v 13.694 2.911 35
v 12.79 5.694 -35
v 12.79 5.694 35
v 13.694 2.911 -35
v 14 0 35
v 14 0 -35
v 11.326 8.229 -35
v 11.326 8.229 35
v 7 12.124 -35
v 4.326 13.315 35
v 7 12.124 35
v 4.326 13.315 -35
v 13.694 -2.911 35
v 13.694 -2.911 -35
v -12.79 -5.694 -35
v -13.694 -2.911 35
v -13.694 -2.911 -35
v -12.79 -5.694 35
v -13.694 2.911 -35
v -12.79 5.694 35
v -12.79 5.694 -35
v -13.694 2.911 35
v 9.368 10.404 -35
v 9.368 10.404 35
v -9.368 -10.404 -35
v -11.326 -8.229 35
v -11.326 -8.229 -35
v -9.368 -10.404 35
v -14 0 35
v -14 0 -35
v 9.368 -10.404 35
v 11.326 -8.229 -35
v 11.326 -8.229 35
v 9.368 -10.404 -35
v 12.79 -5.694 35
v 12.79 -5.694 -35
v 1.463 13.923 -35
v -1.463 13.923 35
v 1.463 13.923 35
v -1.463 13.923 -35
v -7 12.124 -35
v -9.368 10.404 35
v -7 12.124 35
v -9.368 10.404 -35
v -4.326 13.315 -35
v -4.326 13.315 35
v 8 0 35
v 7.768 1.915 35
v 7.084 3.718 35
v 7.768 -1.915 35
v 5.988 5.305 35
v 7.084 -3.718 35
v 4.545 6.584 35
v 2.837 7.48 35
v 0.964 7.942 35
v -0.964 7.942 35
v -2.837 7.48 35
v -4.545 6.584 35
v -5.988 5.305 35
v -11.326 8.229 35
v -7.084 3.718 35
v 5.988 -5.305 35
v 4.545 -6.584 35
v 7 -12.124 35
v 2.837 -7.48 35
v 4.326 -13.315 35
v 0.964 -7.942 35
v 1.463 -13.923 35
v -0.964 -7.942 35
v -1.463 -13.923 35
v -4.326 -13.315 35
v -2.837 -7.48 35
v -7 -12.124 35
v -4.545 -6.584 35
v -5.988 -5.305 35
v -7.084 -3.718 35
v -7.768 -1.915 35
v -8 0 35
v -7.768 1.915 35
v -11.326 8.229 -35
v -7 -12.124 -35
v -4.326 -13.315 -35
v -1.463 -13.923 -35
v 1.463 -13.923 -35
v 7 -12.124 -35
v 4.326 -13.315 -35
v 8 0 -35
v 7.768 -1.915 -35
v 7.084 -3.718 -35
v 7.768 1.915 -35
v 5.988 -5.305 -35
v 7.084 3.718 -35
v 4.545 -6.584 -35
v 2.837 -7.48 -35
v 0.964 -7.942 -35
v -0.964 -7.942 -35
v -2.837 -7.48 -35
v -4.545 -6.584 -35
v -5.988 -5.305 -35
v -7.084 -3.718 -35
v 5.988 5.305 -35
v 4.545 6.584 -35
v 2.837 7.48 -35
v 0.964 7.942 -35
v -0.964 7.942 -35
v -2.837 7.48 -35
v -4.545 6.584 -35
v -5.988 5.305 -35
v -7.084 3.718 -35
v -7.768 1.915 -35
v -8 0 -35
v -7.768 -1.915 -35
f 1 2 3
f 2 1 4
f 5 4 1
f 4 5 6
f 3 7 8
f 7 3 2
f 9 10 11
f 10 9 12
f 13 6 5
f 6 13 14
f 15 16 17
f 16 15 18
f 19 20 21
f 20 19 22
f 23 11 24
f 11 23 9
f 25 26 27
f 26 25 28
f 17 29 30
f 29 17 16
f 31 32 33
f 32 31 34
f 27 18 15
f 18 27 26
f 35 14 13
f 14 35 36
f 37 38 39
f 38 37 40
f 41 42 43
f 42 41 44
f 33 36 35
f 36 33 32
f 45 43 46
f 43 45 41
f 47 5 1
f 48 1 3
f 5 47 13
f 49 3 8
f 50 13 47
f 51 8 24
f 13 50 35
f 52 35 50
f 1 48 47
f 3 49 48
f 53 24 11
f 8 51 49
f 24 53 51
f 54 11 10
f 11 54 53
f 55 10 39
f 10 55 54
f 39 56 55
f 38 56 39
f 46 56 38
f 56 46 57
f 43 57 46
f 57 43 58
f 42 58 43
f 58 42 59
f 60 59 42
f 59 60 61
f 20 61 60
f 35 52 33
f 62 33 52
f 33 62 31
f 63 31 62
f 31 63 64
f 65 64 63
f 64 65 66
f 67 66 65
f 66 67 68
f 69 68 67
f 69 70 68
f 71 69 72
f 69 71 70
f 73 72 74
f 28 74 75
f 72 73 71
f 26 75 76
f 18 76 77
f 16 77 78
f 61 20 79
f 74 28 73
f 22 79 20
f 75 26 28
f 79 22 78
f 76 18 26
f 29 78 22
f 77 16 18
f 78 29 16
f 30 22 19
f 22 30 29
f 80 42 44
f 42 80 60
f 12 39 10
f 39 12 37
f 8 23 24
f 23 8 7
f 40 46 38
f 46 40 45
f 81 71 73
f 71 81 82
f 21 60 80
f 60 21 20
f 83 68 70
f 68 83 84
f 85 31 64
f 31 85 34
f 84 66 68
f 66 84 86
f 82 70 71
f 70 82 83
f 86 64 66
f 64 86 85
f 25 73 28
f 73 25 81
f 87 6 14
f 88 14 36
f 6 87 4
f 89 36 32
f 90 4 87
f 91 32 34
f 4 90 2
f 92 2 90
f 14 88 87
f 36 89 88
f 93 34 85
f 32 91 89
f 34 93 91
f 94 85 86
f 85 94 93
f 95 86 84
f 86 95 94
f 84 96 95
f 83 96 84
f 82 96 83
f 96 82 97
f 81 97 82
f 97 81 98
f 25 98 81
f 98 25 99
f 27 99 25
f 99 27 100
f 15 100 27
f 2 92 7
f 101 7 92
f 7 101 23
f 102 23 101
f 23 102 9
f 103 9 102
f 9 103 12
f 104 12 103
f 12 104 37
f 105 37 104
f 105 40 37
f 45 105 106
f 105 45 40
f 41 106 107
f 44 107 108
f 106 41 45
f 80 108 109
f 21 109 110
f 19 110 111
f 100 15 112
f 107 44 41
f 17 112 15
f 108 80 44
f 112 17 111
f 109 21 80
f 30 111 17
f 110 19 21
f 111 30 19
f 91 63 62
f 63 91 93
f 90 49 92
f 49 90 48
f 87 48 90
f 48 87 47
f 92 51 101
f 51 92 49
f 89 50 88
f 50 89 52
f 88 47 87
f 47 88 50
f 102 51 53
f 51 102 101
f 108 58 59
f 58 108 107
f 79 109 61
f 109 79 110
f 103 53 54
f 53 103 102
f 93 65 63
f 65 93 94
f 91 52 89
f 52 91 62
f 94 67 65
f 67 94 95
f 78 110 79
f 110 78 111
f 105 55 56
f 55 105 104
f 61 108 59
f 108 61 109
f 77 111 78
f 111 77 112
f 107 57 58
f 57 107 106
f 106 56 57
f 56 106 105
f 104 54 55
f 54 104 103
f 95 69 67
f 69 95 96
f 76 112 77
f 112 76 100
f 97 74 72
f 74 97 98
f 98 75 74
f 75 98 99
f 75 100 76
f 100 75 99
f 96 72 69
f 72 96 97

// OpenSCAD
// Parameters
inner_diameter = 16.0; // Through bore diameter
outer_diameter = 28.0; // Outer diameter of the bearing
length = 70.0;         // Overall length of the bearing

// Linear bearing body
module linear_bearing_body() {
    cylinder(d=outer_diameter, h=length, center=true);
}

// Through bore
module through_bore() {
    cylinder(d=inner_diameter, h=length + 2, center=true);
}

// Linear bearing assembly
module linear_bearing() {
    difference() {
        linear_bearing_body();
        through_bore();
    }
}

// Render the linear bearing
linear_bearing();
